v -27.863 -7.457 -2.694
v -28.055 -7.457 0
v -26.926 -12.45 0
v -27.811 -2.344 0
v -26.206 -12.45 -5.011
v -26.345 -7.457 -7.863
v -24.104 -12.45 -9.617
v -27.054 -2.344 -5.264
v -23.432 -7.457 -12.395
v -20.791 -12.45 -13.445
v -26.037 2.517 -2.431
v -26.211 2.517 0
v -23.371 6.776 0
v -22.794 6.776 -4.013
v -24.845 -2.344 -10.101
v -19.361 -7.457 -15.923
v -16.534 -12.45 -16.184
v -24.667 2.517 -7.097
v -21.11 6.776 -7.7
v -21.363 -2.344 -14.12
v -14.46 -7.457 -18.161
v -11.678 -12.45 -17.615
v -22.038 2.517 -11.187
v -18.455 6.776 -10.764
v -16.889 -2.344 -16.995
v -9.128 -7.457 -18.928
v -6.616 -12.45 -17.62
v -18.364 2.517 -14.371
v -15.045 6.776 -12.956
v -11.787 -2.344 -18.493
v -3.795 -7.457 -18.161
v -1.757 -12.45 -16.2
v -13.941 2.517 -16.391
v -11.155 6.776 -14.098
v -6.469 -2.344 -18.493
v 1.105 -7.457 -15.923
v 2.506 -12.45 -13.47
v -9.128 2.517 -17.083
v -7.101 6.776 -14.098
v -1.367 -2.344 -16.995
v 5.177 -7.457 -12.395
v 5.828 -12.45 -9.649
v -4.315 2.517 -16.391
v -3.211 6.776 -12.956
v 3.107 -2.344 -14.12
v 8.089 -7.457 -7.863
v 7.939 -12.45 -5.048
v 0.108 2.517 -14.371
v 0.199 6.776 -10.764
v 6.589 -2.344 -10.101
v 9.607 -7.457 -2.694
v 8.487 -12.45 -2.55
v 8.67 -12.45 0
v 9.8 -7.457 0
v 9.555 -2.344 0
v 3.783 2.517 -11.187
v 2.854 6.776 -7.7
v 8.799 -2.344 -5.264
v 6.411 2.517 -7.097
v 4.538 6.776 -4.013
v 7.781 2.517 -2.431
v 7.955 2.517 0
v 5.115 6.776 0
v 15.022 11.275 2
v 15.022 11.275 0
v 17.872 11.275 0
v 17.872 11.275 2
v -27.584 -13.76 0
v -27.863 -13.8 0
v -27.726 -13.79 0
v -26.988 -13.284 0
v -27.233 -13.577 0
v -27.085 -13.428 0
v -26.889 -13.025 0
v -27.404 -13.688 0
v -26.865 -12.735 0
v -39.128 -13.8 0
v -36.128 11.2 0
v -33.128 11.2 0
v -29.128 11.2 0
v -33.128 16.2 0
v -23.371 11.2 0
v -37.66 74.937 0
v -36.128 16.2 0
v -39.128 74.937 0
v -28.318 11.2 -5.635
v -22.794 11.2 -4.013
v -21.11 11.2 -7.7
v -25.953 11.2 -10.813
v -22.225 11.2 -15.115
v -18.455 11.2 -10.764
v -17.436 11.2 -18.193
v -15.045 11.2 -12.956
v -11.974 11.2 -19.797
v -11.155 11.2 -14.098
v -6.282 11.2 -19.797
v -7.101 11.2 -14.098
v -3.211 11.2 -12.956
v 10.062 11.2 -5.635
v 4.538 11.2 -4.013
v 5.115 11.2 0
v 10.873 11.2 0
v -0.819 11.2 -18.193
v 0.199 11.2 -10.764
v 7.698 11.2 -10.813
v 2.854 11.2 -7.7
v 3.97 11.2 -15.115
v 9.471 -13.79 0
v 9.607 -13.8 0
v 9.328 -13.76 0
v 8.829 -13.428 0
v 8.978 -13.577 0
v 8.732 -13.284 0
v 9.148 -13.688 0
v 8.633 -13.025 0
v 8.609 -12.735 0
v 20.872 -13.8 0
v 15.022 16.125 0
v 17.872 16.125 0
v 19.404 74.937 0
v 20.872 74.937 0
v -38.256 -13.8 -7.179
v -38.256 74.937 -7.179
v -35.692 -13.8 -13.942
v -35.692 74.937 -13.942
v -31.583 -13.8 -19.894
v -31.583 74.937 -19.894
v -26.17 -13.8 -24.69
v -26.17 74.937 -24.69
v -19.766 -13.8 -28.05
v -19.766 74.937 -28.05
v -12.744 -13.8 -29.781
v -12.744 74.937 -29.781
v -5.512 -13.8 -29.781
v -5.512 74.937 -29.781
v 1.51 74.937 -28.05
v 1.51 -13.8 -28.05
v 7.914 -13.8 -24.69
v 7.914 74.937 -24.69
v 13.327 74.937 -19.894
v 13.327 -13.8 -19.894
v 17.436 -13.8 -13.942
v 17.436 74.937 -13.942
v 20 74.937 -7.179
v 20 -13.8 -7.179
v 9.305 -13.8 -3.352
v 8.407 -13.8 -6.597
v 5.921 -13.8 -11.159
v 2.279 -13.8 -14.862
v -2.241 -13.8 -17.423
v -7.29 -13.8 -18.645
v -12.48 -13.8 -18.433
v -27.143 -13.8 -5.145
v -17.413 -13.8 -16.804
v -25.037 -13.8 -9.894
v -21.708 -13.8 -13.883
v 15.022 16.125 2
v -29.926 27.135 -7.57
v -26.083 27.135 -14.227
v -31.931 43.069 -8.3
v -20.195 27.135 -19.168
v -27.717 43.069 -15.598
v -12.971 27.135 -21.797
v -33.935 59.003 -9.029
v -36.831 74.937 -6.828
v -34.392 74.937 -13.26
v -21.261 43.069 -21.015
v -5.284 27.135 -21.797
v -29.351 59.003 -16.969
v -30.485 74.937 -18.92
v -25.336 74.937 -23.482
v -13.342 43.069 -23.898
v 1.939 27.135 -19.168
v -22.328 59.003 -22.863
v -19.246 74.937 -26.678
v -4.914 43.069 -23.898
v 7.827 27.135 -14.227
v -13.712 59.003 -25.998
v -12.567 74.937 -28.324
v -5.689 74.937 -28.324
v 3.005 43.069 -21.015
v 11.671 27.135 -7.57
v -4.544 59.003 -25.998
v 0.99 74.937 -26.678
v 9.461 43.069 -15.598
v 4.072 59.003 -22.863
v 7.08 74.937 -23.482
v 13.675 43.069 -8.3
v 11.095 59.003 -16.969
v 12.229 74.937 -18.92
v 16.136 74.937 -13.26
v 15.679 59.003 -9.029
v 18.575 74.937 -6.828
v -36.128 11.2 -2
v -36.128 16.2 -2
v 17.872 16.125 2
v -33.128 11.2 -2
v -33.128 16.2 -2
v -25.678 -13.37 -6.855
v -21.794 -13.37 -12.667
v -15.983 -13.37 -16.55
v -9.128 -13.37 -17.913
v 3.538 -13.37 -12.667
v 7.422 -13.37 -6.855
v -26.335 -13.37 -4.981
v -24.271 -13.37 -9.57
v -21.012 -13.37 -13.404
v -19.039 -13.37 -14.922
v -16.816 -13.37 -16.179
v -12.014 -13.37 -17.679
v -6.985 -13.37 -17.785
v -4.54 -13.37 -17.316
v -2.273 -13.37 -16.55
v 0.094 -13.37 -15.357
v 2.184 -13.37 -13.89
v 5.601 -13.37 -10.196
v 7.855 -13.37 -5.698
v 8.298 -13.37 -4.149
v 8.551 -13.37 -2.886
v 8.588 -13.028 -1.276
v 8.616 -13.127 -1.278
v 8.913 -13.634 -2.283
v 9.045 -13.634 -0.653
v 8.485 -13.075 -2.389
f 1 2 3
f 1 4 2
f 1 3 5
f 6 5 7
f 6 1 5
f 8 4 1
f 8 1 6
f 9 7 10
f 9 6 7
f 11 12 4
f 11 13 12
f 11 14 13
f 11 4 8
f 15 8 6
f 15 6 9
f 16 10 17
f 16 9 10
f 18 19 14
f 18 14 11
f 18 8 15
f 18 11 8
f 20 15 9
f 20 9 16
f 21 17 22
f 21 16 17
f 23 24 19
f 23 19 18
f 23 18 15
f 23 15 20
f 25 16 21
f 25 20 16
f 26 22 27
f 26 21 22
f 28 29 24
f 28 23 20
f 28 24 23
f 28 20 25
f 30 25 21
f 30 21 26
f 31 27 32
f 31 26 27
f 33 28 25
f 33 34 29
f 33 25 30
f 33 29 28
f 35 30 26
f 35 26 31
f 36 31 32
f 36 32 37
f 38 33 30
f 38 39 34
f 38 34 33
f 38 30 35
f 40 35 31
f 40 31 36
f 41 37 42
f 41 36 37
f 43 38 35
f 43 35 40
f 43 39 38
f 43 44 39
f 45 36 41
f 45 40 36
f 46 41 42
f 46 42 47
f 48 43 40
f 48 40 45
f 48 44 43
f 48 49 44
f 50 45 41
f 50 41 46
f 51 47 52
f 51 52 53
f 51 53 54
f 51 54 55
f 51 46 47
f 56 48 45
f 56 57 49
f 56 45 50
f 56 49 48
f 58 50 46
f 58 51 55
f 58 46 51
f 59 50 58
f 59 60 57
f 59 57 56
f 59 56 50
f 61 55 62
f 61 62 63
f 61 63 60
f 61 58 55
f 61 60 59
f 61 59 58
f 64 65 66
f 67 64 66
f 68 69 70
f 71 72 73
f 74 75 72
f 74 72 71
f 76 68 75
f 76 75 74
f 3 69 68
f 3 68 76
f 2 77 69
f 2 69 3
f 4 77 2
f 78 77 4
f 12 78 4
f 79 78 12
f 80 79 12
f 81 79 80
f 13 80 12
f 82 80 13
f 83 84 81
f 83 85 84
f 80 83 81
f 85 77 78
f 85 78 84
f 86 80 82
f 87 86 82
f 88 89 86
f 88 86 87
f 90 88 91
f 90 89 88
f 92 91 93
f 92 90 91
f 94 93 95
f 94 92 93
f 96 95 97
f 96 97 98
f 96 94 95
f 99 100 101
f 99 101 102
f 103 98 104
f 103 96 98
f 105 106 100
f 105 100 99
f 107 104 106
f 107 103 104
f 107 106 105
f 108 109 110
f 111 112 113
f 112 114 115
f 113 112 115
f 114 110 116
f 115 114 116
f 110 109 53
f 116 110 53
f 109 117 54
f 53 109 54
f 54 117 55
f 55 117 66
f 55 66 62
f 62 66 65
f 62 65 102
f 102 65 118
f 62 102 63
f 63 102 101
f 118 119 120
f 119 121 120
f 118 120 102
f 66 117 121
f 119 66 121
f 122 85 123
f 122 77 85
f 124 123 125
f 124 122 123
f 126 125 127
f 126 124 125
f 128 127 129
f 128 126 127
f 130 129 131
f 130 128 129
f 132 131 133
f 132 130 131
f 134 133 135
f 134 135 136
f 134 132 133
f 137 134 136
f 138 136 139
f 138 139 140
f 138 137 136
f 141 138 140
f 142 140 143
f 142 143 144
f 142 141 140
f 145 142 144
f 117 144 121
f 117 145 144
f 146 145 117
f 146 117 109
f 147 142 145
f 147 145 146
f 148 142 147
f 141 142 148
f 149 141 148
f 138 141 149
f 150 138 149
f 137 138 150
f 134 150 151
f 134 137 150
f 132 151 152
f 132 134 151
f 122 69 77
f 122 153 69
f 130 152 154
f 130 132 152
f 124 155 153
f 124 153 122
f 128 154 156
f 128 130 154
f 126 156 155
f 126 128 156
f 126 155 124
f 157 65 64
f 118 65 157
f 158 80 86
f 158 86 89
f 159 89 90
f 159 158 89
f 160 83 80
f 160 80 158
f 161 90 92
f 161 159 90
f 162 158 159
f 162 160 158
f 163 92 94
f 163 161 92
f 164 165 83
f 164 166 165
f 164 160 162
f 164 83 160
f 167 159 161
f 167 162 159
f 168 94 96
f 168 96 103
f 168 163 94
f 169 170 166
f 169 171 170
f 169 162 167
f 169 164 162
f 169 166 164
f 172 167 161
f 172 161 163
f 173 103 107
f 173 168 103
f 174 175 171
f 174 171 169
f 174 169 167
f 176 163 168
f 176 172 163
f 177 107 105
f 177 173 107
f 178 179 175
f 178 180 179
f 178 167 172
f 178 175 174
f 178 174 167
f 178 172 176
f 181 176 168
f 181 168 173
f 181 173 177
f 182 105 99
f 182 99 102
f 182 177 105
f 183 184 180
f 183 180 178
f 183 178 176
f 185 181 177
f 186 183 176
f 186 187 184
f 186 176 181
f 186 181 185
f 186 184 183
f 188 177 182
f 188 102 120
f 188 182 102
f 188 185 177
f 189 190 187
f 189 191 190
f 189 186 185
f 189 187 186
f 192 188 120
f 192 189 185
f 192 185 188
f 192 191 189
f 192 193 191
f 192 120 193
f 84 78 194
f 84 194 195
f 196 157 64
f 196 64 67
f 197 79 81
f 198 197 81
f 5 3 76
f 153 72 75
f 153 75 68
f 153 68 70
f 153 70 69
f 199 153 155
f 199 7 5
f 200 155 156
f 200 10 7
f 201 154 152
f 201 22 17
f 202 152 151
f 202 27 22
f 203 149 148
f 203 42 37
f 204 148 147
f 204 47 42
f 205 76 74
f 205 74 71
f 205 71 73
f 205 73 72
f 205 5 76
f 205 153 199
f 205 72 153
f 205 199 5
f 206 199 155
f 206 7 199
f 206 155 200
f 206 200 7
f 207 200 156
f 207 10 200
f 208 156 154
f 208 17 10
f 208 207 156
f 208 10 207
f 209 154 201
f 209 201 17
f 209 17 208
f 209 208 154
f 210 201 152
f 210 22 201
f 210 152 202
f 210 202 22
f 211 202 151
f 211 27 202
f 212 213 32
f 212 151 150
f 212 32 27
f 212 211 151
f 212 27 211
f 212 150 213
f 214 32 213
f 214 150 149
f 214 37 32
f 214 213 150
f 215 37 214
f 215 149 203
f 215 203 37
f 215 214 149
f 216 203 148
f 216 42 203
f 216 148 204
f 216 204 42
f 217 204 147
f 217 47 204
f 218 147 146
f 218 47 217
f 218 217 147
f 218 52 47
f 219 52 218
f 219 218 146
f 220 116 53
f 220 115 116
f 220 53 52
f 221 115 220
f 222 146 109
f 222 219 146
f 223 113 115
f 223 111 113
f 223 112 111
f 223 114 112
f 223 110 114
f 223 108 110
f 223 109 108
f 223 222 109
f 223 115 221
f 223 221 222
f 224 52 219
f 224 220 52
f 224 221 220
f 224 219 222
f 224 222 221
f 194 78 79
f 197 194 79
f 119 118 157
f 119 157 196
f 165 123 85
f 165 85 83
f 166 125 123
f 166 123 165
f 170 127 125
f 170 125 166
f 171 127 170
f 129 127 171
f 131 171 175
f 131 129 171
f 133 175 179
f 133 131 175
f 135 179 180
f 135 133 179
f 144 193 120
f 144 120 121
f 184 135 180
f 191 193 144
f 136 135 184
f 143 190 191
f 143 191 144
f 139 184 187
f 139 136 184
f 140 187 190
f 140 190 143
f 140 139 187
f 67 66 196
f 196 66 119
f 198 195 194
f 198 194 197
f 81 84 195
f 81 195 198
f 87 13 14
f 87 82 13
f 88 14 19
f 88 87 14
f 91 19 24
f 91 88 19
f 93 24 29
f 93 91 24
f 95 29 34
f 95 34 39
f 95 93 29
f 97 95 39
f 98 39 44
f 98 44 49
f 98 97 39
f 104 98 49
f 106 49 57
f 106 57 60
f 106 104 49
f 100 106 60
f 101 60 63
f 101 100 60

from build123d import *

# Parameters (mm, degrees)
REVOLVE8_ANGLE      = 180
SKETCH5_W           = 2.85
SKETCH5_H           = 4.85
BOSS_EXTRUDE1_DEPTH = 2
SKETCH6_W           = 3
SKETCH6_H           = 5
CUT_EXTRUDE1_DEPTH  = 2
FILLET1_R           = 1


with BuildPart() as part:
    # Sketch3 → Revolve8 (revolve)
    with BuildSketch(Plane.XY):
        with BuildLine():
            Line((-29.128306284, 11.200453936), (-37.660231074, 74.93674596))
            Line((-37.660231074, 74.93674596), (-39.127877823, 74.93674596))
            Line((-39.127877823, 74.93674596), (-39.127877823, -13.799546064))
            Line((-39.127877823, -13.799546064), (-26.361565762, -13.799546064))
            ThreePointArc((-26.361565762, -13.799546064), (-27.930281109, -3.066483557), (-23.370793287, 6.77580121))
            Line((-23.370793287, 6.77580121), (-23.370793287, 11.200453936))
            Line((-23.370793287, 11.200453936), (-29.128306284, 11.200453936))
        make_face()
    revolve(axis=Axis((-9.127877823, 95.858464184, 0), (0, -1, 0)), revolution_arc=REVOLVE8_ANGLE)

    # Sketch5 → Boss-Extrude1 (add)
    with BuildSketch(Plane.XY):
        with Locations((16.447122177, 13.700453936)):
            Rectangle(SKETCH5_W, SKETCH5_H)
    extrude(amount=BOSS_EXTRUDE1_DEPTH)

    # Sketch6 → Cut-Extrude1 (cut)
    with BuildSketch(Plane.XY):
        with Locations((-34.627877823, 13.700453936)):
            Rectangle(SKETCH6_W, SKETCH6_H)
    extrude(amount=-CUT_EXTRUDE1_DEPTH, mode=Mode.SUBTRACT)

    # Fillet1
    fillet1_edges = [part.edges().sort_by_distance(p)[0] for p in [
        (-9.127877823, -13.799546064, -17.23368794),
    ]]
    fillet(fillet1_edges, radius=FILLET1_R)


solid = part.part
